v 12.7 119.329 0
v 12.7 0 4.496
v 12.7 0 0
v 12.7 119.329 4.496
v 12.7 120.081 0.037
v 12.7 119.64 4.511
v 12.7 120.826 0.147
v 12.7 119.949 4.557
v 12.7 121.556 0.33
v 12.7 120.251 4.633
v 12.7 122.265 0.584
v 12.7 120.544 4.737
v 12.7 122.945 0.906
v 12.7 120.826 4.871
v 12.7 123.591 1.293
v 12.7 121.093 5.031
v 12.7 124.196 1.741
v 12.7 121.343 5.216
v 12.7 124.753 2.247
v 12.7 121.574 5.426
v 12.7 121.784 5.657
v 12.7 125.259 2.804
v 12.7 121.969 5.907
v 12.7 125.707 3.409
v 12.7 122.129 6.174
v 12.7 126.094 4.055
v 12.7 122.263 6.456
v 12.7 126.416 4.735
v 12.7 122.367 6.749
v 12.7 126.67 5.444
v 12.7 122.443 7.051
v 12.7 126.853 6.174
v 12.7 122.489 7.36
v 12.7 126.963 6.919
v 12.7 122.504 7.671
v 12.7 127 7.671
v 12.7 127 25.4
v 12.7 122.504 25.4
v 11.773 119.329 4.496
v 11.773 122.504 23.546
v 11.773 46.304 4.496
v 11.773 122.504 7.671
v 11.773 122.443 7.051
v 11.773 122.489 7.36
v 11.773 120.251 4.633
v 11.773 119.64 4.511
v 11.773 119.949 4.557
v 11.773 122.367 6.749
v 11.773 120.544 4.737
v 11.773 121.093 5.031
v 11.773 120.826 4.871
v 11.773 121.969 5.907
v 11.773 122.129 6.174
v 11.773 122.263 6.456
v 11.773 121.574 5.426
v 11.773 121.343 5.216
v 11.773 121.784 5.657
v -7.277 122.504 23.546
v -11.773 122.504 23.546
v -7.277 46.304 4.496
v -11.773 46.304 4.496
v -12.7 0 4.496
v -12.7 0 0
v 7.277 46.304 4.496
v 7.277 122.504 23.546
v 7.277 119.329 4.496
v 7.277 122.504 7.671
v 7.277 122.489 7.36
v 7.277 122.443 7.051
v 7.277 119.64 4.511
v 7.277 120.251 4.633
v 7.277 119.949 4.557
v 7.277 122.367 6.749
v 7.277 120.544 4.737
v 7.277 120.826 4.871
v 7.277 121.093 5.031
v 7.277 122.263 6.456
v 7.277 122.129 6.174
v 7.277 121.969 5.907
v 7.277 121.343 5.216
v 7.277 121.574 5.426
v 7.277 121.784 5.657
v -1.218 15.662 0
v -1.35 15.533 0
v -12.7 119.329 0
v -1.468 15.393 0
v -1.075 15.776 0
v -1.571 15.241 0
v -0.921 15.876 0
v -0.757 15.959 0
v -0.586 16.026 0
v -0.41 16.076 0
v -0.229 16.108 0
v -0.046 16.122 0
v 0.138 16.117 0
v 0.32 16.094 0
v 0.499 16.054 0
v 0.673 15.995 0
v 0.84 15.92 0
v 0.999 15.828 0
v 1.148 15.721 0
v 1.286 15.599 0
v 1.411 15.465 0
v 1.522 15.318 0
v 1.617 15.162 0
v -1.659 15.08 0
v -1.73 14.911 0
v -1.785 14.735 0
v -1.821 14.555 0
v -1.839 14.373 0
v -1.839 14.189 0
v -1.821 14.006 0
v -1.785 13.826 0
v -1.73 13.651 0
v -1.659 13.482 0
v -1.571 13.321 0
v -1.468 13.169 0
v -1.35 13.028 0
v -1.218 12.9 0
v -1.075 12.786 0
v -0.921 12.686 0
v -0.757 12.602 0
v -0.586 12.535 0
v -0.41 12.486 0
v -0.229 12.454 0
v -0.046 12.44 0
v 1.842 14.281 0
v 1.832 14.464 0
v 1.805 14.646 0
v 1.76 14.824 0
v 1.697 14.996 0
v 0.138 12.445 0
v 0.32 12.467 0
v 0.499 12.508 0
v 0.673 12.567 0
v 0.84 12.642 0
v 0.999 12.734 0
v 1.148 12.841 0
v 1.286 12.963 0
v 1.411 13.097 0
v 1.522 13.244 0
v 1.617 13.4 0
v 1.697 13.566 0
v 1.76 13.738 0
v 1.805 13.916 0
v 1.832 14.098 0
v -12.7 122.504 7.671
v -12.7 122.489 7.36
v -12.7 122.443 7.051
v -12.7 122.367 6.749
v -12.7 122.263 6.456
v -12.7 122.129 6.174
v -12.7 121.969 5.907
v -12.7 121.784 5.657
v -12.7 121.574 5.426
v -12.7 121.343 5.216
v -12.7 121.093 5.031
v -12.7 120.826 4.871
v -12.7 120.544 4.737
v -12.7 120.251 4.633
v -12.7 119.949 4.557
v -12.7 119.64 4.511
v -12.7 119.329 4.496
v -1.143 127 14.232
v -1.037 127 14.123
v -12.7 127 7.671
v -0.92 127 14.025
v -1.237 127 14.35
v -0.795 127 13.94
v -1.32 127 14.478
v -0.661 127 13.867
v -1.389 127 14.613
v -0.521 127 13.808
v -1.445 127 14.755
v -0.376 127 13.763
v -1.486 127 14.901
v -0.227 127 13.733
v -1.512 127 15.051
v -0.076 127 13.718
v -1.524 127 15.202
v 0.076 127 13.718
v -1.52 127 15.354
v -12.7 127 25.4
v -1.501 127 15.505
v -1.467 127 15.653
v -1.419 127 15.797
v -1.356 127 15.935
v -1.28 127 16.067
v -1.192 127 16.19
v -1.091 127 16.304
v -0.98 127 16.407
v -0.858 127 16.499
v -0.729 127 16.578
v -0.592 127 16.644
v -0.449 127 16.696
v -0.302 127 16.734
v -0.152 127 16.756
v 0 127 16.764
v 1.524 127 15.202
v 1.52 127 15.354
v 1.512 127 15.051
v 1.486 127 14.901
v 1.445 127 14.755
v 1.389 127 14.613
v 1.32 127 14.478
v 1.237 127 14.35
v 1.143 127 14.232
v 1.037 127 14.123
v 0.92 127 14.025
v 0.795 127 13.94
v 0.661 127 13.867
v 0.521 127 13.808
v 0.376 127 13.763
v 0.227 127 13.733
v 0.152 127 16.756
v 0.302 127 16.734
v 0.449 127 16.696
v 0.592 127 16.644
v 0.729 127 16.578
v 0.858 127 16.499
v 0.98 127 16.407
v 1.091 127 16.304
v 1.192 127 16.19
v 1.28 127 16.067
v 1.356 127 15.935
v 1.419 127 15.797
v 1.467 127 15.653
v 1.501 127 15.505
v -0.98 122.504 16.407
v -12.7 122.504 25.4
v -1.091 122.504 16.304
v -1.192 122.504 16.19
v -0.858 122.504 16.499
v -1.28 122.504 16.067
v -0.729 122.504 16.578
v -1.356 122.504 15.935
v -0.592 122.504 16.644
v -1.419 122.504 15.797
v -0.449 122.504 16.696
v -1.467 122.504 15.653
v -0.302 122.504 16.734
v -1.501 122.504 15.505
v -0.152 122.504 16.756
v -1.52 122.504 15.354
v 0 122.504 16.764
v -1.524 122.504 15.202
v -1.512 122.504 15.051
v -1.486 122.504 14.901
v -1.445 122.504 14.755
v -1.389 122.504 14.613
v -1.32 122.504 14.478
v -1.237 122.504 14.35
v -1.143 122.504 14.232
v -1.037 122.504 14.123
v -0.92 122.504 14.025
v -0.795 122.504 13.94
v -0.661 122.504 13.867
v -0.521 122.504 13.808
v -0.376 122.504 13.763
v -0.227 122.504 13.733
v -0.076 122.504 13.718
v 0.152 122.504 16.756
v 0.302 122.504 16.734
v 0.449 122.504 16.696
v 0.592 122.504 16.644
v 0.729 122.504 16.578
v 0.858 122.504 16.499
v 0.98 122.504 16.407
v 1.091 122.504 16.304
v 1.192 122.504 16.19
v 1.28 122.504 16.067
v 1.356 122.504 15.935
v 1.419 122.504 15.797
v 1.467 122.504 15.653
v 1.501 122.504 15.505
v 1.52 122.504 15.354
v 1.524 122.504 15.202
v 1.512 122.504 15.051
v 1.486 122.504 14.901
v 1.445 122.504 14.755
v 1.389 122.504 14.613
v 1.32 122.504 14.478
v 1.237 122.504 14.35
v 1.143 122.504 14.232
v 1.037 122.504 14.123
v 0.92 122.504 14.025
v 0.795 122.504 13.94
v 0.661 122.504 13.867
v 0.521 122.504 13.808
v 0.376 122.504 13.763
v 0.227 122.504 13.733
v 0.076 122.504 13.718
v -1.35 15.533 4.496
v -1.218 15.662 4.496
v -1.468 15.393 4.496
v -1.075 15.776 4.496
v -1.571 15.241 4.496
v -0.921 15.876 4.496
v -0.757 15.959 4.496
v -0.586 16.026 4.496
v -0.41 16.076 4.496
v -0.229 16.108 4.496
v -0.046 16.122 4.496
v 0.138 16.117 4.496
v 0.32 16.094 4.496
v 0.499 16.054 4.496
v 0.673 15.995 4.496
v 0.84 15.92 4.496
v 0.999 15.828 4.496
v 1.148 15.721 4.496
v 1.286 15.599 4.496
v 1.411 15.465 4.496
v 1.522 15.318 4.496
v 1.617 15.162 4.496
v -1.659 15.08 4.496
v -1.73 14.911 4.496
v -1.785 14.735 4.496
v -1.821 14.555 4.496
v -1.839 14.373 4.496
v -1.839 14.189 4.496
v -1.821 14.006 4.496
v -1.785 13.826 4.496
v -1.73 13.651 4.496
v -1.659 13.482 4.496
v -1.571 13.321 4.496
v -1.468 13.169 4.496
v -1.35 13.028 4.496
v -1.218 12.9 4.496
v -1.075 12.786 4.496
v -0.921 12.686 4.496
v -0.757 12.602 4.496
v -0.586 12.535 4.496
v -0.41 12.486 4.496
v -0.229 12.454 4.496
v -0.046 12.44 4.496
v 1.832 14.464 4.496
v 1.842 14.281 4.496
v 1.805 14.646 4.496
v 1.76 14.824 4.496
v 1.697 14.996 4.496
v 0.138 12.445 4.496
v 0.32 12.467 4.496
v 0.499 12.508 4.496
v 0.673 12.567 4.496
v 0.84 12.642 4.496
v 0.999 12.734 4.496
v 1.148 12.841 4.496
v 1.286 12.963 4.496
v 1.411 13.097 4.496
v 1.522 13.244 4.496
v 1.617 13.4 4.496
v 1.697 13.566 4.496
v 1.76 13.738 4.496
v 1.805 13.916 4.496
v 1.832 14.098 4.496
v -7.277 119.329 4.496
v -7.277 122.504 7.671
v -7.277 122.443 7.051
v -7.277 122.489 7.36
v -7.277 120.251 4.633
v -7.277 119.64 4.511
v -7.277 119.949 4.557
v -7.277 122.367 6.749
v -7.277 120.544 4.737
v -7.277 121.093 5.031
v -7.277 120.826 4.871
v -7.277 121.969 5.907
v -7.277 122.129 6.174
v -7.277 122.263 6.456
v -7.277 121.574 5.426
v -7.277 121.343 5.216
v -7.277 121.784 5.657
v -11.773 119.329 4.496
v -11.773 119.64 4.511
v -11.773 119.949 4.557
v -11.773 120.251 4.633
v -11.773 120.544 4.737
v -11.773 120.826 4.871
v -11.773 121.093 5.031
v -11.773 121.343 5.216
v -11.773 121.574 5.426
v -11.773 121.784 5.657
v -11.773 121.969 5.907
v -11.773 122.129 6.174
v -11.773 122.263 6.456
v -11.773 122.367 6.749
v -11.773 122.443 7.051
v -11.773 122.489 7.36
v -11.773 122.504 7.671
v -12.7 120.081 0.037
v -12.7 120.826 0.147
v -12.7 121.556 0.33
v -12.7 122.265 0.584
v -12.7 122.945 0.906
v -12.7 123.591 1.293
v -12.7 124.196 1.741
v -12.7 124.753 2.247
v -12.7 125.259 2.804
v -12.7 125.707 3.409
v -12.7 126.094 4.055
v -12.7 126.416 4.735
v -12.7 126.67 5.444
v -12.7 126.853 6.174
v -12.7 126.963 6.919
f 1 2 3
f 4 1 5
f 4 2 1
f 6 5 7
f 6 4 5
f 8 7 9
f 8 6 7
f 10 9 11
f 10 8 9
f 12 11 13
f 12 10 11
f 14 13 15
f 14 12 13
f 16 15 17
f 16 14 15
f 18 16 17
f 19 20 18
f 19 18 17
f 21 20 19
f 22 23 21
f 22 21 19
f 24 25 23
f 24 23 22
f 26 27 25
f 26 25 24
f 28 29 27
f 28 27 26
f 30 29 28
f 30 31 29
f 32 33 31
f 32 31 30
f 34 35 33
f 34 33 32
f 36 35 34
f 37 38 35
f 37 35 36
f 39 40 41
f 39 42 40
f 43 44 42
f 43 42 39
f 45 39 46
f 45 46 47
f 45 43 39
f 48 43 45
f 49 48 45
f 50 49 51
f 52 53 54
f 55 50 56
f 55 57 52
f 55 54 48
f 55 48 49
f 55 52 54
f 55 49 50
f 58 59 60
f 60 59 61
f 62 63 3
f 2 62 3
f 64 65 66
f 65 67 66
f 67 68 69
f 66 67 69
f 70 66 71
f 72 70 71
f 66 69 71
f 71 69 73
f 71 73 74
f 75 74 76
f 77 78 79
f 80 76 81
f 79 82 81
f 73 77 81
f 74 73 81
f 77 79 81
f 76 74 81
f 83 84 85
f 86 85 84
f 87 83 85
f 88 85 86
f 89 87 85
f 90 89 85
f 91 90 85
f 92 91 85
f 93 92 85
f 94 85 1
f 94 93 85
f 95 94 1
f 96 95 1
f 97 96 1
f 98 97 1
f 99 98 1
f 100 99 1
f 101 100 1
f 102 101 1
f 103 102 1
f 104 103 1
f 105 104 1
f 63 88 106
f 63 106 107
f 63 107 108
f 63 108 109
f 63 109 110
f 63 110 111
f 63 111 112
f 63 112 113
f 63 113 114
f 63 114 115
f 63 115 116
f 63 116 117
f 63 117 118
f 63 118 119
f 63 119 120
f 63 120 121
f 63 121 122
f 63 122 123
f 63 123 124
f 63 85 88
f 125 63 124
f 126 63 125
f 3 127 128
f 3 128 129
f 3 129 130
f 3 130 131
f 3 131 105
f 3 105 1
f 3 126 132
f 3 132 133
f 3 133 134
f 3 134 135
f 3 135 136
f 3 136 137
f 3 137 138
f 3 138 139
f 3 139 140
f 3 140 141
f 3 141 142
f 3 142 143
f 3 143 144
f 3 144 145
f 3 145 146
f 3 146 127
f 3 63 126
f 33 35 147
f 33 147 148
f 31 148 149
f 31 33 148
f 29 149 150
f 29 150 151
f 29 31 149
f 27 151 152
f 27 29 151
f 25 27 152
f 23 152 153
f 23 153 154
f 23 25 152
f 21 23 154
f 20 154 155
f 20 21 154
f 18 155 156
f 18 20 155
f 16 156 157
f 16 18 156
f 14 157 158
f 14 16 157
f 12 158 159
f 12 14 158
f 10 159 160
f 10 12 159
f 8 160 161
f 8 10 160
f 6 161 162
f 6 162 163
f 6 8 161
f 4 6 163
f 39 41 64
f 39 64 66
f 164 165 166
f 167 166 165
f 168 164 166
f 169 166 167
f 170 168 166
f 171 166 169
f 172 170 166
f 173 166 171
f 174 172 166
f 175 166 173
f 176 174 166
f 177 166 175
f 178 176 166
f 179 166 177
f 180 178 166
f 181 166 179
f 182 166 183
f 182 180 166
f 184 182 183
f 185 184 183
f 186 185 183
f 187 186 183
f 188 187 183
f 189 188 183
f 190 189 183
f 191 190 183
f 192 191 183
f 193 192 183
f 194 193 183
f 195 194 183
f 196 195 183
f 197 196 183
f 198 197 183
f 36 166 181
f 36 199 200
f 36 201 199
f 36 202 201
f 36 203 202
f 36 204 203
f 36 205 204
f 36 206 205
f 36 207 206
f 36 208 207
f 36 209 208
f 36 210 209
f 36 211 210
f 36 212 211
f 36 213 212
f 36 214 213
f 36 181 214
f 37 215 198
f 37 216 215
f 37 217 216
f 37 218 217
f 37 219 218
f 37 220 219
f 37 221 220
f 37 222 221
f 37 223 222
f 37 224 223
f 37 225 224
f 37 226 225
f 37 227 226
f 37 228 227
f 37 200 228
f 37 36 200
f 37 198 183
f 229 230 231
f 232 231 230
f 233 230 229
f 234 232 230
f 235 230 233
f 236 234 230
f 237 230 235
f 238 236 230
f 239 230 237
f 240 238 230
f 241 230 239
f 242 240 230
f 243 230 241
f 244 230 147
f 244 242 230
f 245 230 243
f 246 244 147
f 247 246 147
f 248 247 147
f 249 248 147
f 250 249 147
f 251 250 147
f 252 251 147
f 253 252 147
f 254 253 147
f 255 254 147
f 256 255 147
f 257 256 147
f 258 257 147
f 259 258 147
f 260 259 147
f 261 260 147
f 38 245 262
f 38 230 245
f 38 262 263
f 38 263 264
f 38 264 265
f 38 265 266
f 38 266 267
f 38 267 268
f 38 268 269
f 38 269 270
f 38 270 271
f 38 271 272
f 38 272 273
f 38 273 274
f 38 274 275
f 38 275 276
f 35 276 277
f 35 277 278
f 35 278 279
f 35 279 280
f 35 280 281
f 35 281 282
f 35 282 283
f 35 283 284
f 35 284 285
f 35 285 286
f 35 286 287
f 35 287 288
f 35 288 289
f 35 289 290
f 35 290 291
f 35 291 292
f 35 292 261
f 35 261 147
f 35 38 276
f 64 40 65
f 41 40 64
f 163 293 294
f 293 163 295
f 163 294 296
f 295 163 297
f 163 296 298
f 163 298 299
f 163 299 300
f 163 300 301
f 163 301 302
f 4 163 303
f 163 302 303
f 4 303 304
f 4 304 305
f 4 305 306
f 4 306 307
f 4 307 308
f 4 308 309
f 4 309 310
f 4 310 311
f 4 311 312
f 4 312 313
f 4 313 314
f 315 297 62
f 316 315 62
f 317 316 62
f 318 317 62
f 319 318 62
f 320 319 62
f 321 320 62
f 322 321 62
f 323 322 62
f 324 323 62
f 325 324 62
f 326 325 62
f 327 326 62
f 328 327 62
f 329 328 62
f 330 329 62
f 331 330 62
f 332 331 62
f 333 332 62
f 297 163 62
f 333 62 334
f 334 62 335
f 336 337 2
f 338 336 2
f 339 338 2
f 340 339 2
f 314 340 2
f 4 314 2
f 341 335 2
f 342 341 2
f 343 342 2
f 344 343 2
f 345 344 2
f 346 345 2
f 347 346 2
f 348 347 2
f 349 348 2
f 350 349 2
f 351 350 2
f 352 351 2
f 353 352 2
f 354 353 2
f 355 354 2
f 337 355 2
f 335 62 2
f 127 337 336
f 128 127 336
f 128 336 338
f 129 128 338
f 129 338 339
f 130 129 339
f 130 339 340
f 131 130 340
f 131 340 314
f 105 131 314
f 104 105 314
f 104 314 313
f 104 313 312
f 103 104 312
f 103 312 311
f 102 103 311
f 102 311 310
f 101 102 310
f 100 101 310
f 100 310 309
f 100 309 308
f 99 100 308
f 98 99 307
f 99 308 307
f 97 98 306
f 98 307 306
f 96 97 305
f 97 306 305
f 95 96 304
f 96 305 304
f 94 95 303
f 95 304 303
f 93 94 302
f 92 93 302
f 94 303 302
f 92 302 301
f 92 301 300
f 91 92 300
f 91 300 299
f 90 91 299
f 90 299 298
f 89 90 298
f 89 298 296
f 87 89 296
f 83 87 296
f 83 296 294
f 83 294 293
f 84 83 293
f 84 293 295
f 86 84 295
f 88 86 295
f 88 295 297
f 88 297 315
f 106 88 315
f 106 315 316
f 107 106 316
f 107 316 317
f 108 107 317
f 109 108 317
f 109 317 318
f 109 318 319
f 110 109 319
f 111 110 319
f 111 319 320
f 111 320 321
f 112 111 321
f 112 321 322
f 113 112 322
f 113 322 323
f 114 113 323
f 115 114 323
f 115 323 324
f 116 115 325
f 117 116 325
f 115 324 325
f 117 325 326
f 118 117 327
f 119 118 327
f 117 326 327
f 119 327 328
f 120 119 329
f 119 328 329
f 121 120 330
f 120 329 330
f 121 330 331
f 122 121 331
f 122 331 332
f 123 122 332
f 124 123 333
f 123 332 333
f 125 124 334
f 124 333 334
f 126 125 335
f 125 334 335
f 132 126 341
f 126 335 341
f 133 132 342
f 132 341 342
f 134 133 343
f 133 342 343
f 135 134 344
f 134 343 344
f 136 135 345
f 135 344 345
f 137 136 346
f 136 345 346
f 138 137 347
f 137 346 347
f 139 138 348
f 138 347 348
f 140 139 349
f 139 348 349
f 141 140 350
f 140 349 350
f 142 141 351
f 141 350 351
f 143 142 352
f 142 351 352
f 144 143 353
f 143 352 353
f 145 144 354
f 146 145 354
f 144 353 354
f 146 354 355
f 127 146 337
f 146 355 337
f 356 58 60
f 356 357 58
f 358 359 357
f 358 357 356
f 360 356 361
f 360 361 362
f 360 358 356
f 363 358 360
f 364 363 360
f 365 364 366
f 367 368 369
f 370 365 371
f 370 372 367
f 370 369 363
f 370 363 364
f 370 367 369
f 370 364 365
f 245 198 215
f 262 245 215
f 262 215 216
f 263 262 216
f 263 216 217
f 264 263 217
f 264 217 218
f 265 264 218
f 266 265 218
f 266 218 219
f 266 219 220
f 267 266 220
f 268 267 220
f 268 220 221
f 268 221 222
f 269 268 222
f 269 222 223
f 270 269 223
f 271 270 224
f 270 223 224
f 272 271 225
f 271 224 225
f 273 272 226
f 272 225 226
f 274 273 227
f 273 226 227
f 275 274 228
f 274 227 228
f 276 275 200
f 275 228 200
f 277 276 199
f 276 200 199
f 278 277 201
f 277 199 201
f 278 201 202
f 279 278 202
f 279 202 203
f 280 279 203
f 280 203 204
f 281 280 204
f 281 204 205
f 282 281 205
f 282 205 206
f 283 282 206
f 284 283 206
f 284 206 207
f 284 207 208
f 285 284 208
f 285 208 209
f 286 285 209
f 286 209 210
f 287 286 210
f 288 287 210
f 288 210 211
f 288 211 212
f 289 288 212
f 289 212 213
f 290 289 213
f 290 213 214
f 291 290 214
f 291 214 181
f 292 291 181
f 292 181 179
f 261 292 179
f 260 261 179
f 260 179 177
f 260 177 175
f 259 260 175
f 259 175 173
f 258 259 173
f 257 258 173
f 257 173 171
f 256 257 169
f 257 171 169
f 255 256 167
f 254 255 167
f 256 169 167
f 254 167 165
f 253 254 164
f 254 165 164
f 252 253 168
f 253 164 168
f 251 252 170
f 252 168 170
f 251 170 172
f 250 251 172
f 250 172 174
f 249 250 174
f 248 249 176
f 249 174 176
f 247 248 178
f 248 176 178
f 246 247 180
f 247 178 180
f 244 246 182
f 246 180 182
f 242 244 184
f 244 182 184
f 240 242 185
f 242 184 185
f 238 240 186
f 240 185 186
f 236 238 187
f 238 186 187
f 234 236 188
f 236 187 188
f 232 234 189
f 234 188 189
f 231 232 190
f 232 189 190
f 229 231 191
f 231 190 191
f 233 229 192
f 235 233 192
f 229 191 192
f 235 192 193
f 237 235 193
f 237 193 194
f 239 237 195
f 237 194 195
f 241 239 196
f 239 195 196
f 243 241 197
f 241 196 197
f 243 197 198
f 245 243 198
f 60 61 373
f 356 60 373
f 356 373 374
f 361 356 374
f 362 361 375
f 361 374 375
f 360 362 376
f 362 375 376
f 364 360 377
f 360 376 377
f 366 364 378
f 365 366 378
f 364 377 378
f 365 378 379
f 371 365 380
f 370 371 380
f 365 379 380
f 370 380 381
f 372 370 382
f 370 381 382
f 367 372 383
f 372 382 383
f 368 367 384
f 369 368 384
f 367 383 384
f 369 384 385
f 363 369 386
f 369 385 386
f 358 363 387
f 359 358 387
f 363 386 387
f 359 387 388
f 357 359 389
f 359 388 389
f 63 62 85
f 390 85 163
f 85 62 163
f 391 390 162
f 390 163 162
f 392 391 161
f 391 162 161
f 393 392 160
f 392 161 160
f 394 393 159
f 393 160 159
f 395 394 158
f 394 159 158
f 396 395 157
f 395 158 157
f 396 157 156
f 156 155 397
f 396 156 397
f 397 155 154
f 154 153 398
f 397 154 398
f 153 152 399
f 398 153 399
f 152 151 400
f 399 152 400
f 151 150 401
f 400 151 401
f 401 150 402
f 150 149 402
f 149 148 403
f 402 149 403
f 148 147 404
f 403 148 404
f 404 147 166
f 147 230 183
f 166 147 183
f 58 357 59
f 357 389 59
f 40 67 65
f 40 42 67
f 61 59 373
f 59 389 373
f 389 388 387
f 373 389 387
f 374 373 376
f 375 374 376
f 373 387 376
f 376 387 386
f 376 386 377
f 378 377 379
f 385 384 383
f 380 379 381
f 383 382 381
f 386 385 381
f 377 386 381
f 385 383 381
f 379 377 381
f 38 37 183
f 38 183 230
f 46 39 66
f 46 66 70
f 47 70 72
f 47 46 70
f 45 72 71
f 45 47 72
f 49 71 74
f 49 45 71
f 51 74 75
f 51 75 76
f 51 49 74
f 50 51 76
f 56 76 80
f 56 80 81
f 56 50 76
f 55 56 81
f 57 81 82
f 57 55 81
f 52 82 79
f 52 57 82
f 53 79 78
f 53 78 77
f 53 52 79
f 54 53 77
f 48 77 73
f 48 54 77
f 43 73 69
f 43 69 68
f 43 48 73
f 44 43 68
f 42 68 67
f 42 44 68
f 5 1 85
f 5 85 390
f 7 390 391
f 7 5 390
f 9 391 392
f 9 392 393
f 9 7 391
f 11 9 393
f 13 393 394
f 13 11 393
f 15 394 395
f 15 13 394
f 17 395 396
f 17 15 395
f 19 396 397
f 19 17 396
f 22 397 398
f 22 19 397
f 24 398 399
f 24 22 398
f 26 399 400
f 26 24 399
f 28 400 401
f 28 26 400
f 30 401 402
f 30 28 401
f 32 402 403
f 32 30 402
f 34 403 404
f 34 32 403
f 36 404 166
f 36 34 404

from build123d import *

# Parameters (mm, degrees)
SKETCH2_W                    = 25.4
SKETCH2_H                    = 4.4958
BASE_FLANGE1_DEPTH           = 127
EDGE_FLANGE1_STRIP_W         = 24.3332
EDGE_FLANGE1_STRIP_H         = 4.4958
EDGE_FLANGE1_STRIP_CUT_DEPTH = 25.4
EDGE_FLANGE1_DEPTH           = 25.4
CUT_EXTRUDE1_REACH           = 132.136
SKETCH10_R                   = 1.524
SKETCH11_R                   = 1.8415
CUT_EXTRUDE2_DEPTH           = 130.333969156
BOSS_EXTRUDE1_START          = 9.525
BOSS_EXTRUDE1_DEPTH          = 2.2479


# Sheet-metal steps are written as plain solids
with BuildPart() as part:
    # Sketch2 → Base-Flange1 (new body)
    with BuildSketch(Plane(origin=(0, 0, 0), x_dir=(1, 0, 0), z_dir=(0, 1, 0))):
        with Locations((0, -2.2479)):
            Rectangle(SKETCH2_W, SKETCH2_H)
    extrude(amount=BASE_FLANGE1_DEPTH)

    # Edge-Flange1 strip (across the edge) → Edge-Flange1 strip cut (cut)
    with BuildSketch(Plane(origin=(12.7, 127, 4.4958), x_dir=(0, -1, 0), z_dir=(-1, 0, 0))):
        with Locations((-4.4958, -2.2479)):
            Rectangle(EDGE_FLANGE1_STRIP_W, EDGE_FLANGE1_STRIP_H)
    extrude(amount=EDGE_FLANGE1_STRIP_CUT_DEPTH, mode=Mode.SUBTRACT)

    # Edge-Flange1 section (across the edge) → Edge-Flange1 (add)
    with BuildSketch(Plane(origin=(12.7, 127, 4.4958), x_dir=(0, -1, 0), z_dir=(-1, 0, 0))):
        with BuildLine():
            Line((0, 3.175), (0, 20.9042))
            Line((0, 20.9042), (4.4958, 20.9042))
            Line((4.4958, 20.9042), (4.4958, 3.175))
            ThreePointArc((4.4958, 3.175), (5.42573597, 0.92993597), (7.6708, 0))
            Line((7.6708, 0), (7.6708, -4.4958))
            ThreePointArc((7.6708, -4.4958), (2.246725303, -2.249074697), (0, 3.175))
        make_face()
    extrude(amount=EDGE_FLANGE1_DEPTH)

    # Sketch10 → Cut-Extrude1 (cut, up to next)
    with BuildSketch(Plane(origin=(0, 127, 0), x_dir=(1, 0, 0), z_dir=(0, 1, 0)), mode=Mode.PRIVATE) as cut_extrude1_sk1:
        with Locations(Location((0, -15.24, 0), (0, 0, 270))):
            Circle(SKETCH10_R)
    cut_extrude1_tool1 = extrude(cut_extrude1_sk1.sketch, amount=-CUT_EXTRUDE1_REACH, mode=Mode.PRIVATE) & part.part
    add(cut_extrude1_tool1.solids().sort_by_distance((0, 127, 15.24))[0], mode=Mode.SUBTRACT)

    # Sketch11 → Cut-Extrude2 (cut, through all)
    with BuildSketch(Plane.XY.offset(4.4958)):
        with Locations((0, 14.280866767)):
            Circle(SKETCH11_R)
    extrude(amount=-CUT_EXTRUDE2_DEPTH, mode=Mode.SUBTRACT)


with BuildPart() as body_2:
    # Sketch12 → Boss-Extrude1 (new, symmetric)
    with BuildSketch(Plane(origin=(0, 0, 0), x_dir=(0, 0, -1), z_dir=(1, 0, 0)).offset(BOSS_EXTRUDE1_START)):
        with BuildLine():
            Line((-23.5458, 122.5042), (-4.4958, 46.3042))
            Line((-4.4958, 46.3042), (-4.4958, 119.3292))
            ThreePointArc((-4.4958, 119.3292), (-5.42573597, 121.57426403), (-7.6708, 122.5042))
            Line((-7.6708, 122.5042), (-23.5458, 122.5042))
        make_face()
    extrude(amount=BOSS_EXTRUDE1_DEPTH, both=True)


with BuildPart() as body_3:
    # Mirror2: mirrored copy
    add(body_2.part.mirror(Plane(origin=(0, 0, 0), x_dir=(0, 0, 1), z_dir=(1, 0, 0))))


solid = Compound([part.part, body_2.part, body_3.part])
